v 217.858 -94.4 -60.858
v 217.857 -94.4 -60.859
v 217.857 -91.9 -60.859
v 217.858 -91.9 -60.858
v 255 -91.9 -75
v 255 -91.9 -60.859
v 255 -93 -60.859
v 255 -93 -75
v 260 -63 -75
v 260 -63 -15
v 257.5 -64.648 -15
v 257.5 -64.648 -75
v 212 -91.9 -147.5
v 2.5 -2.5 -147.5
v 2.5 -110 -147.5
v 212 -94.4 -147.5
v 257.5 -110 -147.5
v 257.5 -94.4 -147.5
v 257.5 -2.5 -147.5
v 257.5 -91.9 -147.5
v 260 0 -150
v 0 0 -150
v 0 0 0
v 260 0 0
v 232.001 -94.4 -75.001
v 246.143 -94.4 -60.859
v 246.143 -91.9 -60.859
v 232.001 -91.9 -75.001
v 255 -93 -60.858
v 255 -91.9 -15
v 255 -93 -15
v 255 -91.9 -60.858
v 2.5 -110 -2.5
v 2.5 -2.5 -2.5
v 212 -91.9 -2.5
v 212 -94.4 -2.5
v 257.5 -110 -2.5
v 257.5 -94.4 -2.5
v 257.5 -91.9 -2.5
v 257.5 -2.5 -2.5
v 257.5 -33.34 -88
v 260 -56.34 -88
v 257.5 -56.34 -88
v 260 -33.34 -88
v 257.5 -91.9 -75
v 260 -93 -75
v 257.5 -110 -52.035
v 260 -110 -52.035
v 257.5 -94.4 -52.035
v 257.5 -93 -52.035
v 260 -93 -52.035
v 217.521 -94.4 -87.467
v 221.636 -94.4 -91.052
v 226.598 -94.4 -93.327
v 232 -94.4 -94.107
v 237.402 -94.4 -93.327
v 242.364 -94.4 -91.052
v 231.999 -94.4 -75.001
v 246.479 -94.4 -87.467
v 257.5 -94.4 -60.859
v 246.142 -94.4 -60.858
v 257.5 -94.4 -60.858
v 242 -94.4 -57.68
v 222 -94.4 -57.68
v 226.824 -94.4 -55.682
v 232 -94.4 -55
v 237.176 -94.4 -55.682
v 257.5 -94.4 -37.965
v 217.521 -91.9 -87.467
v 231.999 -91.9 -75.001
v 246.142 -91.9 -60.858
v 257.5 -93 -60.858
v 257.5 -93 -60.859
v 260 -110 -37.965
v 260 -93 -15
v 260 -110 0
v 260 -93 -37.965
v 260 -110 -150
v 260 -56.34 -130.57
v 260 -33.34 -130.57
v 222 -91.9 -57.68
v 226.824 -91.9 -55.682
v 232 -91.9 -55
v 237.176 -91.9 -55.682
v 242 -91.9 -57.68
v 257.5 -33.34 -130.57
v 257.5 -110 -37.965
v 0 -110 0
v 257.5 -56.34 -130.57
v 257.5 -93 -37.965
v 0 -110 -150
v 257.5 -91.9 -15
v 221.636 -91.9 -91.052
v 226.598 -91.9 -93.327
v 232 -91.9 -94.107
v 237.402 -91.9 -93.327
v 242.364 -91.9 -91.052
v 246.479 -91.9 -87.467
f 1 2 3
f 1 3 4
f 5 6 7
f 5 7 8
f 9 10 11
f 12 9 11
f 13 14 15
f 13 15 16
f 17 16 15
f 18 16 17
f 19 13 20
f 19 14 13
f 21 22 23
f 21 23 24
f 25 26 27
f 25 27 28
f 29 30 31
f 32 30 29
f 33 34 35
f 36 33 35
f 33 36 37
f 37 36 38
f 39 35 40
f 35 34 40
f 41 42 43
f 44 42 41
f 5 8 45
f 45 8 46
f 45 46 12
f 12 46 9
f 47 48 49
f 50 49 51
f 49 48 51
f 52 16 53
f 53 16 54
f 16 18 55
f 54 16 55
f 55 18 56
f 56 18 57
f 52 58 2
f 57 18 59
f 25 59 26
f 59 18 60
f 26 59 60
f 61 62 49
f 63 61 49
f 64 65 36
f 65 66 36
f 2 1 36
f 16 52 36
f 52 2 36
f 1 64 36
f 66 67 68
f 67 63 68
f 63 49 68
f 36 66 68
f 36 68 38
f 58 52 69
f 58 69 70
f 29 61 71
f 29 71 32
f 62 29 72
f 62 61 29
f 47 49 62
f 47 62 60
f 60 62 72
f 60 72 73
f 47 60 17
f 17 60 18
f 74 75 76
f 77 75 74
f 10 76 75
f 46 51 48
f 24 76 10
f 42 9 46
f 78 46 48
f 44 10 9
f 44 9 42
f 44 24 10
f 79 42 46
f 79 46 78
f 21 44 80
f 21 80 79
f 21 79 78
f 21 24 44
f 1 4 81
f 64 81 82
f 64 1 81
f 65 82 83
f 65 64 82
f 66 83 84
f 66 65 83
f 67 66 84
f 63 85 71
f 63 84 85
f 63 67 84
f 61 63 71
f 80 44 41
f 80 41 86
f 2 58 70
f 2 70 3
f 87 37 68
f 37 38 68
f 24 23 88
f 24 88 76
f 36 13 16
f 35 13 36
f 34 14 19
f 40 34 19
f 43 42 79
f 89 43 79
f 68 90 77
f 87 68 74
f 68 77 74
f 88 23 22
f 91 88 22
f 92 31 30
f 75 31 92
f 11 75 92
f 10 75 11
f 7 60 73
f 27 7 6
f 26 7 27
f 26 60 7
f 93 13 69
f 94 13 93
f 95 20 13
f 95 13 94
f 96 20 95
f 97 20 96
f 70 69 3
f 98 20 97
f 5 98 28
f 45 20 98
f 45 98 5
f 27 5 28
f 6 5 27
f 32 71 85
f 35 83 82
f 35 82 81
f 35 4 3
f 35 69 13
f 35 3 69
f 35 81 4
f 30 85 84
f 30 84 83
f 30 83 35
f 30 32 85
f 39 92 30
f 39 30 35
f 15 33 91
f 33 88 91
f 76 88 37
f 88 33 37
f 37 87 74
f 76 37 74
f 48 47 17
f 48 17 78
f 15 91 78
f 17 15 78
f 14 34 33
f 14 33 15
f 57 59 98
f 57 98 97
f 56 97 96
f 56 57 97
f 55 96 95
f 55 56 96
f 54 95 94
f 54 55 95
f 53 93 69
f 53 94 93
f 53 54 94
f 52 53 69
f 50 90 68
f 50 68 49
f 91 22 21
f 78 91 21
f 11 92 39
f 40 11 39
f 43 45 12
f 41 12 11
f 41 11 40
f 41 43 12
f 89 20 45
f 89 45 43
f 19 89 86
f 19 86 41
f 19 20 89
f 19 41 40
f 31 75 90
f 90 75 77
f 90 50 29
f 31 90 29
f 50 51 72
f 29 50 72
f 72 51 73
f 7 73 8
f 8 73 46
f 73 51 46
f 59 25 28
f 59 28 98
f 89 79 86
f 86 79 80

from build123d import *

# Parameters (mm, degrees)
SKETCH1_W               = 260
SKETCH1_H               = 150
SKETCH1_W_2             = 255
SKETCH1_H_2             = 145
BOSS_EXTRUDE1_DEPTH     = 110
SKETCH2_W               = 255
SKETCH2_H               = 145
BOSS_EXTRUDE2_DEPTH     = 2.5
SKETCH4_W               = 145
SKETCH4_H               = 2.5
BOSS_EXTRUDE3_DEPTH     = 45.5
CUT_EXTRUDE_THIN4_DEPTH = 5
SKETCH6_W               = 60
SKETCH6_H               = 30
CUT_EXTRUDE1_DEPTH      = 5
BOSS_EXTRUDE4_REACH     = 294.104
CUT_EXTRUDE2_DEPTH      = 3
SKETCH10_W              = 42.57
SKETCH10_H              = 23
CUT_EXTRUDE3_DEPTH      = 2.5
CUT_EXTRUDE4_DEPTH      = 2.5


with BuildPart() as part:
    # Sketch1 → Boss-Extrude1 (new body)
    with BuildSketch(Plane(origin=(0, 0, 0), x_dir=(1, 0, 0), z_dir=(0, 1, 0))):
        with Locations((130, 75)):
            Rectangle(SKETCH1_W, SKETCH1_H)
        with Locations((130, 75)):
            Rectangle(SKETCH1_W_2, SKETCH1_H_2, mode=Mode.SUBTRACT)
    extrude(amount=-BOSS_EXTRUDE1_DEPTH)

    # Sketch2 → Boss-Extrude2 (add)
    with BuildSketch(Plane(origin=(0, 0, 0), x_dir=(1, 0, 0), z_dir=(0, 1, 0))):
        with Locations((130, 75)):
            Rectangle(SKETCH2_W, SKETCH2_H)
    extrude(amount=-BOSS_EXTRUDE2_DEPTH)

    # Sketch4 → Boss-Extrude3 (add)
    with BuildSketch(Plane.ZY.offset(-257.5)):
        with Locations((-75, -93.15)):
            Rectangle(SKETCH4_W, SKETCH4_H)
    extrude(amount=BOSS_EXTRUDE3_DEPTH)

    # Sketch5 → Cut-Extrude-Thin4 (cut)
    with BuildSketch(Plane.XZ.offset(94.4)):
        Polygon((217.857864376, -60.857864376), (232, -75), (246.142135624, -60.857864376), (257.5, -60.857864376), (257.5, -60.858864376), (246.142549837, -60.858864376), (232, -75.001414214), (217.857157269, -60.858571483), align=None)
        with BuildLine():
            ThreePointArc((246.141113376, -60.858886624), (232, -55.001445677), (217.858886624, -60.858886624))
            Line((217.858886624, -60.858886624), (217.858179517, -60.858179517))
            ThreePointArc((217.858179517, -60.858179517), (232, -55.000445677), (246.141820483, -60.858179517))
            Line((246.141820483, -60.858179517), (246.141113376, -60.858886624))
        make_face()
    extrude(amount=-CUT_EXTRUDE_THIN4_DEPTH, mode=Mode.SUBTRACT)


with BuildPart() as cut_extrude_thin4_kept_piece:
    # of the separate pieces the step leaves, the one the design keeps (cut_extrude_thin4_pieces_kept)
    add(part.part.solids().sort_by_distance((0, 0, 0))[0])

    # Sketch6 → Cut-Extrude1 (cut)
    with BuildSketch(Plane(origin=(260, 0, 0), x_dir=(0, 0, -1), z_dir=(1, 0, 0))):
        with Locations((45, -78)):
            Rectangle(SKETCH6_W, SKETCH6_H)
    extrude(amount=-CUT_EXTRUDE1_DEPTH, mode=Mode.SUBTRACT)

    # Sketch8 → Boss-Extrude4 (add, up to next)
    with BuildSketch(Plane.XY.offset(-75), mode=Mode.PRIVATE) as boss_extrude4_sk1:
        Polygon((260, -63), (257.5, -64.647820306), (257.5, -63), align=None)
    boss_extrude4_tool1 = extrude(boss_extrude4_sk1.sketch, amount=BOSS_EXTRUDE4_REACH, mode=Mode.PRIVATE) - cut_extrude_thin4_kept_piece.part
    add(boss_extrude4_tool1.solids().sort_by_distance((258.333333, -63.549273, -75))[0])

    # Sketch9 → Cut-Extrude2 (cut)
    with BuildSketch(Plane.XZ.offset(94.4)):
        with BuildLine():
            Line((232, -75), (246.479283082, -87.467045982))
            ThreePointArc((246.479283082, -87.467045982), (232, -94.106984956), (217.520716918, -87.467045982))
            Line((217.520716918, -87.467045982), (232, -75))
        make_face()
    extrude(amount=-CUT_EXTRUDE2_DEPTH, mode=Mode.SUBTRACT)

    # Sketch10 → Cut-Extrude3 (cut)
    with BuildSketch(Plane(origin=(260, 0, 0), x_dir=(0, 0, -1), z_dir=(1, 0, 0))):
        with Locations((109.285, -44.84)):
            Rectangle(SKETCH10_W, SKETCH10_H)
    extrude(amount=-CUT_EXTRUDE3_DEPTH, mode=Mode.SUBTRACT)

    # Sketch11 → Cut-Extrude4 (cut)
    with BuildSketch(Plane(origin=(260, 0, 0), x_dir=(0, 0, -1), z_dir=(1, 0, 0))):
        Polygon((45, -93), (37.965, -93), (37.965, -110), (52.035, -110), (52.035, -93), align=None)
    extrude(amount=-CUT_EXTRUDE4_DEPTH, mode=Mode.SUBTRACT)


solid = cut_extrude_thin4_kept_piece.part
